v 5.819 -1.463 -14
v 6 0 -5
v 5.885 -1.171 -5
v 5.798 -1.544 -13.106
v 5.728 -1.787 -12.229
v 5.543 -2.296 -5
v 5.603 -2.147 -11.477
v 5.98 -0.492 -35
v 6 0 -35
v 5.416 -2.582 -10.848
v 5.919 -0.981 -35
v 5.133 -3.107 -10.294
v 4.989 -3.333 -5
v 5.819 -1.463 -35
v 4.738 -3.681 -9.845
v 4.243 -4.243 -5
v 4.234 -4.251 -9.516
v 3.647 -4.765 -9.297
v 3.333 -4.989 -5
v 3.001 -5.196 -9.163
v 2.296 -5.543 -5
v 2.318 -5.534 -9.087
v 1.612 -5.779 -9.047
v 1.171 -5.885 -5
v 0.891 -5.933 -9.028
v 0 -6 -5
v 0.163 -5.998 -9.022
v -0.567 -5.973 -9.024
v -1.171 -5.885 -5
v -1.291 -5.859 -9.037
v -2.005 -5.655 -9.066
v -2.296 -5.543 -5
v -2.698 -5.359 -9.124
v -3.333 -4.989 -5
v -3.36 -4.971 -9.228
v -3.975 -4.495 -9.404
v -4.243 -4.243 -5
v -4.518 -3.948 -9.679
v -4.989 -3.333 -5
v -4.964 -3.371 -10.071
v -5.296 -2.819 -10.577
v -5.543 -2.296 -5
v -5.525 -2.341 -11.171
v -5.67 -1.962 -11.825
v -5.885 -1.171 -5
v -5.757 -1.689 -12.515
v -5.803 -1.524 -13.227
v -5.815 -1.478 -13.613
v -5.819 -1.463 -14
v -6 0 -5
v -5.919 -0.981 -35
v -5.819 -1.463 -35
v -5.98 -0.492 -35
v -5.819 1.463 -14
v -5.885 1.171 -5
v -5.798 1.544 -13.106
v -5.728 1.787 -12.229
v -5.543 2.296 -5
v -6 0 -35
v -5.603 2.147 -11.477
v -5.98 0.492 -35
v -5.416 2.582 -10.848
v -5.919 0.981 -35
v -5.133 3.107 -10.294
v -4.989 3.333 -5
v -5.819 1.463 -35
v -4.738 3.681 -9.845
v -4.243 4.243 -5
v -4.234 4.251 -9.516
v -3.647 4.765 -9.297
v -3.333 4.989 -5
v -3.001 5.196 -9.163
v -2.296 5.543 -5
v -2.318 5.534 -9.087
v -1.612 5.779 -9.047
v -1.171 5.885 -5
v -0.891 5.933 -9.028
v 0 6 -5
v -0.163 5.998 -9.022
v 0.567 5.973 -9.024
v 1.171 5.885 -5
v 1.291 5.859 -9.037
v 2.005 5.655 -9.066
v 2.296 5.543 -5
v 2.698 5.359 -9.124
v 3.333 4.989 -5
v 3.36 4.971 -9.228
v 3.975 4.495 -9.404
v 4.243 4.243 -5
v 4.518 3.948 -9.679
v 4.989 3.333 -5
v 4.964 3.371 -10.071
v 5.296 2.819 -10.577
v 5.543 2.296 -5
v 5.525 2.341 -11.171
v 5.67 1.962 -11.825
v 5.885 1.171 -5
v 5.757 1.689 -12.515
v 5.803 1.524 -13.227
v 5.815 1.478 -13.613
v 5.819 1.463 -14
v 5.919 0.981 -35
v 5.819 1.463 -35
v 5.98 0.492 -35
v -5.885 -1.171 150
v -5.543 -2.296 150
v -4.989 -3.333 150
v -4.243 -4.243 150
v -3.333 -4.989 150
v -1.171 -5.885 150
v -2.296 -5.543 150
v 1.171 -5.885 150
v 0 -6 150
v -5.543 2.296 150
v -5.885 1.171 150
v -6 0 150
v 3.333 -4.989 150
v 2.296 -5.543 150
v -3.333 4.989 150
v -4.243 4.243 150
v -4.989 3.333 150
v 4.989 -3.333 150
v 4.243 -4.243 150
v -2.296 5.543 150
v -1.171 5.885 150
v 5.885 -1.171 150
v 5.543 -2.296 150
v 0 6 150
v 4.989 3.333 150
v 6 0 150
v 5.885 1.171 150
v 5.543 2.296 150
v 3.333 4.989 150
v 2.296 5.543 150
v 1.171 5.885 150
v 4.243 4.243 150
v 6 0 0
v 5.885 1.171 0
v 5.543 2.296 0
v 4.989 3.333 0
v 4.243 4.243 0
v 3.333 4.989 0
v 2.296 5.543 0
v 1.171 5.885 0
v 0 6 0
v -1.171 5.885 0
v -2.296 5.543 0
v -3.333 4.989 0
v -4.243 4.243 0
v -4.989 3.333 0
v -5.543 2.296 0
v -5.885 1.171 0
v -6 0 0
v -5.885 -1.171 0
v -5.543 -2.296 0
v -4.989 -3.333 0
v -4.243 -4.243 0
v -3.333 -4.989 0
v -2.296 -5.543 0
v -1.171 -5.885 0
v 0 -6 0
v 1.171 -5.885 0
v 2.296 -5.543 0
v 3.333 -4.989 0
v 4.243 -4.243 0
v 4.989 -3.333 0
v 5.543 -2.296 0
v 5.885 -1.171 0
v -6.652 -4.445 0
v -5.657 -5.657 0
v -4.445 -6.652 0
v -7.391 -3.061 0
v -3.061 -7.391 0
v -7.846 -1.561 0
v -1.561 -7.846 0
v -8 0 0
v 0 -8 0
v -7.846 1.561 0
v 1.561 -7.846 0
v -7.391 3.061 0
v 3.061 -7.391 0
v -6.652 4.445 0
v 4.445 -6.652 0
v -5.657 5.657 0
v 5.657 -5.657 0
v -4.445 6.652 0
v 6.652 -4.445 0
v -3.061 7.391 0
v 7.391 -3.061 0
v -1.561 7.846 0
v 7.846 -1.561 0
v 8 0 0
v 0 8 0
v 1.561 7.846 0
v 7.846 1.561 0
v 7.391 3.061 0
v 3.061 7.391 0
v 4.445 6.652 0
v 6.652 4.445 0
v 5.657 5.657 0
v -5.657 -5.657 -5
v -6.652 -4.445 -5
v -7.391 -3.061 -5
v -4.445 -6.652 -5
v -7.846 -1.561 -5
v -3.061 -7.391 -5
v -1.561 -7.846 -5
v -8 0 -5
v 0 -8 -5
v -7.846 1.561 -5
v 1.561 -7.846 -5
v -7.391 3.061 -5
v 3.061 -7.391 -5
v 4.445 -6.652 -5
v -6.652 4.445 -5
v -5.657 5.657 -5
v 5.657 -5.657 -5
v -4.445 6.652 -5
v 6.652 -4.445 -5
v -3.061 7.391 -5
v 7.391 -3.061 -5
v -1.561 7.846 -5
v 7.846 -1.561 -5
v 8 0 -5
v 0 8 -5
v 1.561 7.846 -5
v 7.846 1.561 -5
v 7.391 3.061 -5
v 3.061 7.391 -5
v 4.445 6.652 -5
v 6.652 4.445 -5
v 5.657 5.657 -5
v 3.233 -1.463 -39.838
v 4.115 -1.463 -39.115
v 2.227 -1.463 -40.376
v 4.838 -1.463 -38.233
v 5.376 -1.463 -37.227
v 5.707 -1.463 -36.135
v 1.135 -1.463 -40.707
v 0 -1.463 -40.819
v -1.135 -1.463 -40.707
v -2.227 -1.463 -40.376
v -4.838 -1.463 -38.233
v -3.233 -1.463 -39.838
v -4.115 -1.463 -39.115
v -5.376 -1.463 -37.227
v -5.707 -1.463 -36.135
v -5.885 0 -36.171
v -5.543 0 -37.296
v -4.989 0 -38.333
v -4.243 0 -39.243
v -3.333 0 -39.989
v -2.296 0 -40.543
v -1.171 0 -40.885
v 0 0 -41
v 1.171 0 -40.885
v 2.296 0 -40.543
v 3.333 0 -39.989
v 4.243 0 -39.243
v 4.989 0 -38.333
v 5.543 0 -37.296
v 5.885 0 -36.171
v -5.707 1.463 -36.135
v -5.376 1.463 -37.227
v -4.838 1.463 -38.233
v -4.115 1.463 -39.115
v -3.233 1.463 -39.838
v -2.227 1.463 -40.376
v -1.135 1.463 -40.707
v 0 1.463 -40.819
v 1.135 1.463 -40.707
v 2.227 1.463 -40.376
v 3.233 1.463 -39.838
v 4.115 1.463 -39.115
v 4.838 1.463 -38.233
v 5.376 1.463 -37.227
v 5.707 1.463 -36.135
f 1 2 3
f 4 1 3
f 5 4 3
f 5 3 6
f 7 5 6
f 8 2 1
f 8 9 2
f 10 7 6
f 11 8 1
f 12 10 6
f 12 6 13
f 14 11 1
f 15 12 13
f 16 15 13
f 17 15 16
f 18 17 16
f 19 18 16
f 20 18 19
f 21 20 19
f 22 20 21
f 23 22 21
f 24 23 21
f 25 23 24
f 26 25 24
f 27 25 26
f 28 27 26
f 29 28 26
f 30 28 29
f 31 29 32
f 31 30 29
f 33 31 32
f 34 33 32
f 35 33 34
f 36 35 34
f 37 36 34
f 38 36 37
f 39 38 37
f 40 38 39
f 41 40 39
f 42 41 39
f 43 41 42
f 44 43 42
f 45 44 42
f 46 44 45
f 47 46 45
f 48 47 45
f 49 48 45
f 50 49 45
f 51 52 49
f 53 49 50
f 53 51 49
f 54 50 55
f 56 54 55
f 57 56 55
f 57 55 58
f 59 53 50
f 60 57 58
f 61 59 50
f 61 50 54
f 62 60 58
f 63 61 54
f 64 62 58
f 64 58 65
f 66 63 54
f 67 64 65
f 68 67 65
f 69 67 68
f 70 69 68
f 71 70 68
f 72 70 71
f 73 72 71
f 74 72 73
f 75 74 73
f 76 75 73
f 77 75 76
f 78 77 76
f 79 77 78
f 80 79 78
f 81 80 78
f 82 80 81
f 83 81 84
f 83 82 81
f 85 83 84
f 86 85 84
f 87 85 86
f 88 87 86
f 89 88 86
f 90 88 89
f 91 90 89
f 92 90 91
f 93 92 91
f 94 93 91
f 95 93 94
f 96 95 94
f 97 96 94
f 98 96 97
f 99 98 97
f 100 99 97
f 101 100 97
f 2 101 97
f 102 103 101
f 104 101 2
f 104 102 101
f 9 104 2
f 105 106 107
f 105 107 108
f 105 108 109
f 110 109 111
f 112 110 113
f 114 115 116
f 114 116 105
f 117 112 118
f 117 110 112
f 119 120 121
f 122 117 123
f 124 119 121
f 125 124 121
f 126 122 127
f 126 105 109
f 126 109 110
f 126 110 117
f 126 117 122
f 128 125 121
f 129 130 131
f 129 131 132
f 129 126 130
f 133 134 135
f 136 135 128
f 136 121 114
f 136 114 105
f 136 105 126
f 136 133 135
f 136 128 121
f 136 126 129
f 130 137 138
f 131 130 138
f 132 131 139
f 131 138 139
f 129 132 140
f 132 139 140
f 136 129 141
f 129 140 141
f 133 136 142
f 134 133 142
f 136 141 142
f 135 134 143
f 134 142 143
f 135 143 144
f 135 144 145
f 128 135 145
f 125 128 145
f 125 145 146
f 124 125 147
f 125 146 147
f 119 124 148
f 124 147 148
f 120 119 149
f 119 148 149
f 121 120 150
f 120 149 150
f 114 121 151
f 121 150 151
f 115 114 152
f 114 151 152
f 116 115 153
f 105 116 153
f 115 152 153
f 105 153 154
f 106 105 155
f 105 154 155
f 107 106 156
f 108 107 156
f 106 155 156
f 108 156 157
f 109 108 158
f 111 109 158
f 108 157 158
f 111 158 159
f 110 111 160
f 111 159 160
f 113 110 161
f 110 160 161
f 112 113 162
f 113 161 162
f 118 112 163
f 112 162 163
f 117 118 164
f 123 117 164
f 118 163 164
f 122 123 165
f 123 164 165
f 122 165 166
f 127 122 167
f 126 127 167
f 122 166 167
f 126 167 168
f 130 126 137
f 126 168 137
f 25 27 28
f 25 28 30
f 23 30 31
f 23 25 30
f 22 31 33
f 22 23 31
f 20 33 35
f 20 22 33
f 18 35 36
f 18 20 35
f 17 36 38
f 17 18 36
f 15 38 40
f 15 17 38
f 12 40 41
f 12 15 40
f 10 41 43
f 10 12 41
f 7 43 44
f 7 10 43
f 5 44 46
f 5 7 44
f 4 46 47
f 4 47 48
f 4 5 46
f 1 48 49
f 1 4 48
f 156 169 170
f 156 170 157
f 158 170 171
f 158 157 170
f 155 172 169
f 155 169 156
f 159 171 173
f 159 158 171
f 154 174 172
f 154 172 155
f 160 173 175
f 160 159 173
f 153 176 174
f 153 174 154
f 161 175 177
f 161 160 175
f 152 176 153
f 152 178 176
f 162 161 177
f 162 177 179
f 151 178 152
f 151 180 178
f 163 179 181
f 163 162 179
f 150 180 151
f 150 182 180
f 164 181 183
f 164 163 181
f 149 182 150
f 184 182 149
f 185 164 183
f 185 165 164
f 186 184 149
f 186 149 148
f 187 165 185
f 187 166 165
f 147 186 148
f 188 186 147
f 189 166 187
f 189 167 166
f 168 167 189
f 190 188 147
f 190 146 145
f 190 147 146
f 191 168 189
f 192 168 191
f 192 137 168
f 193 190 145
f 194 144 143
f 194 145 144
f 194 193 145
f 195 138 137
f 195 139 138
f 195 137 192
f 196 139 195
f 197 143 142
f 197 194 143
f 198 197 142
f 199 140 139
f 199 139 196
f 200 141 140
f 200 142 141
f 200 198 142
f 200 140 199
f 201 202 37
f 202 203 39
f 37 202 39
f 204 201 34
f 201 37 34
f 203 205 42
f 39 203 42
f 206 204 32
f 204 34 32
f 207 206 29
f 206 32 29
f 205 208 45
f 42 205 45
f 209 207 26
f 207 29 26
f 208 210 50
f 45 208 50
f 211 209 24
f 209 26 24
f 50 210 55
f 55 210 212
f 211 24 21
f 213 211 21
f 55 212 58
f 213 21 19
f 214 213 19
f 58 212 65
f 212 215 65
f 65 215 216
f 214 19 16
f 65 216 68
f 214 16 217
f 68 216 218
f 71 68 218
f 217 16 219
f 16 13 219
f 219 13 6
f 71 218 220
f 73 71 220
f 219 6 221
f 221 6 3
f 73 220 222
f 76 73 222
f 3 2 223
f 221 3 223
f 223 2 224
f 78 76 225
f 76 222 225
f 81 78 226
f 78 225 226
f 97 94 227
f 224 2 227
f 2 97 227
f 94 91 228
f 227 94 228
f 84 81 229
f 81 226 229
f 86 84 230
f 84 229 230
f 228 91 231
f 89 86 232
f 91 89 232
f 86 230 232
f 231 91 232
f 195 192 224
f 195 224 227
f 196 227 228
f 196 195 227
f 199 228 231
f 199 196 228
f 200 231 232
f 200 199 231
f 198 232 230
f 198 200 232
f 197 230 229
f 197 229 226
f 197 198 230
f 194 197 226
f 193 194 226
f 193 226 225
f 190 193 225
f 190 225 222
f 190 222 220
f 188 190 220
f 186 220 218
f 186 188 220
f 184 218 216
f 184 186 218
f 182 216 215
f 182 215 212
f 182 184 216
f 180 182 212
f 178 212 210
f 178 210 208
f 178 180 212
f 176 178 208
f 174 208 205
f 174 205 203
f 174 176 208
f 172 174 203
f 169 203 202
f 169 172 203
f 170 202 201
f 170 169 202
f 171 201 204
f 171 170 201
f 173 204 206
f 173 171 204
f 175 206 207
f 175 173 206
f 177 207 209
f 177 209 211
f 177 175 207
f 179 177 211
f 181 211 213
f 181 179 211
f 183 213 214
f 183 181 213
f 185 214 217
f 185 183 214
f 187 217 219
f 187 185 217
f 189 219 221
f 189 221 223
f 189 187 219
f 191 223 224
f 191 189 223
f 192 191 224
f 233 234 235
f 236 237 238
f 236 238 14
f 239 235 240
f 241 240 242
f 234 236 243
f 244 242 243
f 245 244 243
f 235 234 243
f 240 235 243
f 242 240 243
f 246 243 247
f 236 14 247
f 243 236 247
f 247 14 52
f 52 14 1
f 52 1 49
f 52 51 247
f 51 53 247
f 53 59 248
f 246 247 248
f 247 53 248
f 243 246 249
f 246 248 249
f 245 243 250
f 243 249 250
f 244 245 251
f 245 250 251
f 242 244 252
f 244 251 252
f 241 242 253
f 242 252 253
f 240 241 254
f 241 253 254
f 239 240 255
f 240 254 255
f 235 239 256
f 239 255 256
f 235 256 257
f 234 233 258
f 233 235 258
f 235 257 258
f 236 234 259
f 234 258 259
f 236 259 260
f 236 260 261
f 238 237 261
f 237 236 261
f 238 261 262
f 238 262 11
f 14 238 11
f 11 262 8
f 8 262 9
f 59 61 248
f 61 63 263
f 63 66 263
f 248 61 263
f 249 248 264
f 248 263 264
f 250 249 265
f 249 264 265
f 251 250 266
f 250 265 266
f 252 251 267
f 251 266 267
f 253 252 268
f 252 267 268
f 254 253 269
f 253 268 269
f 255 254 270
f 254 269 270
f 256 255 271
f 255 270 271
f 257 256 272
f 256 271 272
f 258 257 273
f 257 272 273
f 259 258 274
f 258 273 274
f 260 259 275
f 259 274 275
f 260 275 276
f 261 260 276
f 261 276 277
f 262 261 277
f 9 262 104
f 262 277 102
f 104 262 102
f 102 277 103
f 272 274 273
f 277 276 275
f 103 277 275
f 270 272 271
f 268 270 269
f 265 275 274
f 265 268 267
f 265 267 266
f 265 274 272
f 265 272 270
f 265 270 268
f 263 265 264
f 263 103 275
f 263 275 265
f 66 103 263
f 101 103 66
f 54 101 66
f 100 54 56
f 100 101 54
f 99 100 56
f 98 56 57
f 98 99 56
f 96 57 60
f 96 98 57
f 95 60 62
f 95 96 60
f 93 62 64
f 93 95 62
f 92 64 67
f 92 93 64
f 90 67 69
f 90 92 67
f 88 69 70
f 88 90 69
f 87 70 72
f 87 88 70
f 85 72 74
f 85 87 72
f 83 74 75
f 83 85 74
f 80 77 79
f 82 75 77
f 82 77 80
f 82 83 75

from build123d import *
from build123d.topology import SkipClean

# Parameters (mm, degrees)
SKETCH_1_R          = 6
EXTRUDE_1_DEPTH     = 150
SKETCH_2_R          = 8
EXTRUDE_2_DEPTH     = 5
EXTRUDE_START       = 30
SKETCH_3_R          = 6
EXTRUDE_5_DEPTH     = 30
SKETCH_9_W          = 19.221444034
SKETCH_9_H          = 5.745349359
CUT_EXTRUDE_7_DEPTH = 40
FILLET_4_R          = 5
FILLET_5_R          = 5


with BuildPart() as part:
    # 草图1 → 凸台-拉伸1 (new body)
    with BuildSketch(Plane.XY):
        Circle(SKETCH_1_R)
    extrude(amount=EXTRUDE_1_DEPTH)

    # 草图2 → 凸台-拉伸2 (add)
    with BuildSketch(Plane.XY):
        Circle(SKETCH_2_R)
    extrude(amount=-EXTRUDE_2_DEPTH)

    # 草图3 → 凸台-拉伸5 (add)
    with BuildSketch(Plane(origin=(0, 0, -5), x_dir=(-1, 0, 0), z_dir=(0, 0, -1)).offset(EXTRUDE_START)):
        with Locations(Location((0, 0, 0), (0, 0, 180))):
            Circle(SKETCH_3_R)
    extrude(amount=-EXTRUDE_5_DEPTH)

    # 草图8 one side → 旋转8 (revolve)
    with SkipClean():  # the faces are left unmerged after this step: merging them gives an invalid solid
        with BuildSketch(Plane(origin=(0, 0, -35), x_dir=(-1, 0, 0), z_dir=(0, 0, -1))):
            with BuildLine():
                Line((0, 6), (0, -6))
                ThreePointArc((0, -6), (4.242640687, -4.242640687), (6, 0))
                ThreePointArc((6, 0), (4.242640687, 4.242640687), (0, 6))
            make_face()
        revolve(axis=Axis((0, 0, -35), (0, -1, 0)))

    # 草图9 → 切除-拉伸7 (cut)
    with BuildSketch(Plane(origin=(0, 0, -9), x_dir=(-1, 0, 0), z_dir=(0, 0, -1))):
        with Locations((0.738599267, 4.336128304)):
            Rectangle(SKETCH_9_W, SKETCH_9_H)
        with Locations((0.738599267, -4.336128304)):
            Rectangle(SKETCH_9_W, SKETCH_9_H)
    extrude(amount=CUT_EXTRUDE_7_DEPTH, mode=Mode.SUBTRACT)

    # 圆角4
    # the kernel refuses this fillet: 5 mm, written as the material it adds along each edge
    with BuildSketch(Plane(origin=(18.318788834, 1.463453624, -9), x_dir=(0, 0, -1), z_dir=(-1, 0, 0))) as fillet_4_piece_1_section:
        with BuildLine():
            CenterArc((FILLET_4_R, -FILLET_4_R), FILLET_4_R, 90, 90)
            Line((0, -FILLET_4_R), (0, 0))
            Line((0, 0), (FILLET_4_R, 0))
        make_face()
    fillet_4_piece_1 = extrude(amount=36.637577667, mode=Mode.PRIVATE)
    fillet_4_piece_1 = fillet_4_piece_1 & Plane(origin=(0, 0, -10.216169301), x_dir=(1, 0, 0), z_dir=(0, 0, -1)) * Cylinder(6, 94, mode=Mode.PRIVATE)
    add(fillet_4_piece_1)

    # 圆角5
    # the kernel refuses this fillet: 5 mm, written as the material it adds along each edge
    with BuildSketch(Plane(origin=(18.318788834, -1.463453624, -9), x_dir=(0, 0, -1), z_dir=(-1, 0, 0))) as fillet_5_piece_1_section:
        with BuildLine():
            CenterArc((FILLET_5_R, FILLET_5_R), FILLET_5_R, 180, 90)
            Line((0, FILLET_5_R), (0, 0))
            Line((0, 0), (FILLET_5_R, 0))
        make_face()
    fillet_5_piece_1 = extrude(amount=36.637577667, mode=Mode.PRIVATE)
    fillet_5_piece_1 = fillet_5_piece_1 & Plane(origin=(0, 0, -10.216169301), x_dir=(1, 0, 0), z_dir=(0, 0, -1)) * Cylinder(6, 94, mode=Mode.PRIVATE)
    add(fillet_5_piece_1)


solid = part.part
